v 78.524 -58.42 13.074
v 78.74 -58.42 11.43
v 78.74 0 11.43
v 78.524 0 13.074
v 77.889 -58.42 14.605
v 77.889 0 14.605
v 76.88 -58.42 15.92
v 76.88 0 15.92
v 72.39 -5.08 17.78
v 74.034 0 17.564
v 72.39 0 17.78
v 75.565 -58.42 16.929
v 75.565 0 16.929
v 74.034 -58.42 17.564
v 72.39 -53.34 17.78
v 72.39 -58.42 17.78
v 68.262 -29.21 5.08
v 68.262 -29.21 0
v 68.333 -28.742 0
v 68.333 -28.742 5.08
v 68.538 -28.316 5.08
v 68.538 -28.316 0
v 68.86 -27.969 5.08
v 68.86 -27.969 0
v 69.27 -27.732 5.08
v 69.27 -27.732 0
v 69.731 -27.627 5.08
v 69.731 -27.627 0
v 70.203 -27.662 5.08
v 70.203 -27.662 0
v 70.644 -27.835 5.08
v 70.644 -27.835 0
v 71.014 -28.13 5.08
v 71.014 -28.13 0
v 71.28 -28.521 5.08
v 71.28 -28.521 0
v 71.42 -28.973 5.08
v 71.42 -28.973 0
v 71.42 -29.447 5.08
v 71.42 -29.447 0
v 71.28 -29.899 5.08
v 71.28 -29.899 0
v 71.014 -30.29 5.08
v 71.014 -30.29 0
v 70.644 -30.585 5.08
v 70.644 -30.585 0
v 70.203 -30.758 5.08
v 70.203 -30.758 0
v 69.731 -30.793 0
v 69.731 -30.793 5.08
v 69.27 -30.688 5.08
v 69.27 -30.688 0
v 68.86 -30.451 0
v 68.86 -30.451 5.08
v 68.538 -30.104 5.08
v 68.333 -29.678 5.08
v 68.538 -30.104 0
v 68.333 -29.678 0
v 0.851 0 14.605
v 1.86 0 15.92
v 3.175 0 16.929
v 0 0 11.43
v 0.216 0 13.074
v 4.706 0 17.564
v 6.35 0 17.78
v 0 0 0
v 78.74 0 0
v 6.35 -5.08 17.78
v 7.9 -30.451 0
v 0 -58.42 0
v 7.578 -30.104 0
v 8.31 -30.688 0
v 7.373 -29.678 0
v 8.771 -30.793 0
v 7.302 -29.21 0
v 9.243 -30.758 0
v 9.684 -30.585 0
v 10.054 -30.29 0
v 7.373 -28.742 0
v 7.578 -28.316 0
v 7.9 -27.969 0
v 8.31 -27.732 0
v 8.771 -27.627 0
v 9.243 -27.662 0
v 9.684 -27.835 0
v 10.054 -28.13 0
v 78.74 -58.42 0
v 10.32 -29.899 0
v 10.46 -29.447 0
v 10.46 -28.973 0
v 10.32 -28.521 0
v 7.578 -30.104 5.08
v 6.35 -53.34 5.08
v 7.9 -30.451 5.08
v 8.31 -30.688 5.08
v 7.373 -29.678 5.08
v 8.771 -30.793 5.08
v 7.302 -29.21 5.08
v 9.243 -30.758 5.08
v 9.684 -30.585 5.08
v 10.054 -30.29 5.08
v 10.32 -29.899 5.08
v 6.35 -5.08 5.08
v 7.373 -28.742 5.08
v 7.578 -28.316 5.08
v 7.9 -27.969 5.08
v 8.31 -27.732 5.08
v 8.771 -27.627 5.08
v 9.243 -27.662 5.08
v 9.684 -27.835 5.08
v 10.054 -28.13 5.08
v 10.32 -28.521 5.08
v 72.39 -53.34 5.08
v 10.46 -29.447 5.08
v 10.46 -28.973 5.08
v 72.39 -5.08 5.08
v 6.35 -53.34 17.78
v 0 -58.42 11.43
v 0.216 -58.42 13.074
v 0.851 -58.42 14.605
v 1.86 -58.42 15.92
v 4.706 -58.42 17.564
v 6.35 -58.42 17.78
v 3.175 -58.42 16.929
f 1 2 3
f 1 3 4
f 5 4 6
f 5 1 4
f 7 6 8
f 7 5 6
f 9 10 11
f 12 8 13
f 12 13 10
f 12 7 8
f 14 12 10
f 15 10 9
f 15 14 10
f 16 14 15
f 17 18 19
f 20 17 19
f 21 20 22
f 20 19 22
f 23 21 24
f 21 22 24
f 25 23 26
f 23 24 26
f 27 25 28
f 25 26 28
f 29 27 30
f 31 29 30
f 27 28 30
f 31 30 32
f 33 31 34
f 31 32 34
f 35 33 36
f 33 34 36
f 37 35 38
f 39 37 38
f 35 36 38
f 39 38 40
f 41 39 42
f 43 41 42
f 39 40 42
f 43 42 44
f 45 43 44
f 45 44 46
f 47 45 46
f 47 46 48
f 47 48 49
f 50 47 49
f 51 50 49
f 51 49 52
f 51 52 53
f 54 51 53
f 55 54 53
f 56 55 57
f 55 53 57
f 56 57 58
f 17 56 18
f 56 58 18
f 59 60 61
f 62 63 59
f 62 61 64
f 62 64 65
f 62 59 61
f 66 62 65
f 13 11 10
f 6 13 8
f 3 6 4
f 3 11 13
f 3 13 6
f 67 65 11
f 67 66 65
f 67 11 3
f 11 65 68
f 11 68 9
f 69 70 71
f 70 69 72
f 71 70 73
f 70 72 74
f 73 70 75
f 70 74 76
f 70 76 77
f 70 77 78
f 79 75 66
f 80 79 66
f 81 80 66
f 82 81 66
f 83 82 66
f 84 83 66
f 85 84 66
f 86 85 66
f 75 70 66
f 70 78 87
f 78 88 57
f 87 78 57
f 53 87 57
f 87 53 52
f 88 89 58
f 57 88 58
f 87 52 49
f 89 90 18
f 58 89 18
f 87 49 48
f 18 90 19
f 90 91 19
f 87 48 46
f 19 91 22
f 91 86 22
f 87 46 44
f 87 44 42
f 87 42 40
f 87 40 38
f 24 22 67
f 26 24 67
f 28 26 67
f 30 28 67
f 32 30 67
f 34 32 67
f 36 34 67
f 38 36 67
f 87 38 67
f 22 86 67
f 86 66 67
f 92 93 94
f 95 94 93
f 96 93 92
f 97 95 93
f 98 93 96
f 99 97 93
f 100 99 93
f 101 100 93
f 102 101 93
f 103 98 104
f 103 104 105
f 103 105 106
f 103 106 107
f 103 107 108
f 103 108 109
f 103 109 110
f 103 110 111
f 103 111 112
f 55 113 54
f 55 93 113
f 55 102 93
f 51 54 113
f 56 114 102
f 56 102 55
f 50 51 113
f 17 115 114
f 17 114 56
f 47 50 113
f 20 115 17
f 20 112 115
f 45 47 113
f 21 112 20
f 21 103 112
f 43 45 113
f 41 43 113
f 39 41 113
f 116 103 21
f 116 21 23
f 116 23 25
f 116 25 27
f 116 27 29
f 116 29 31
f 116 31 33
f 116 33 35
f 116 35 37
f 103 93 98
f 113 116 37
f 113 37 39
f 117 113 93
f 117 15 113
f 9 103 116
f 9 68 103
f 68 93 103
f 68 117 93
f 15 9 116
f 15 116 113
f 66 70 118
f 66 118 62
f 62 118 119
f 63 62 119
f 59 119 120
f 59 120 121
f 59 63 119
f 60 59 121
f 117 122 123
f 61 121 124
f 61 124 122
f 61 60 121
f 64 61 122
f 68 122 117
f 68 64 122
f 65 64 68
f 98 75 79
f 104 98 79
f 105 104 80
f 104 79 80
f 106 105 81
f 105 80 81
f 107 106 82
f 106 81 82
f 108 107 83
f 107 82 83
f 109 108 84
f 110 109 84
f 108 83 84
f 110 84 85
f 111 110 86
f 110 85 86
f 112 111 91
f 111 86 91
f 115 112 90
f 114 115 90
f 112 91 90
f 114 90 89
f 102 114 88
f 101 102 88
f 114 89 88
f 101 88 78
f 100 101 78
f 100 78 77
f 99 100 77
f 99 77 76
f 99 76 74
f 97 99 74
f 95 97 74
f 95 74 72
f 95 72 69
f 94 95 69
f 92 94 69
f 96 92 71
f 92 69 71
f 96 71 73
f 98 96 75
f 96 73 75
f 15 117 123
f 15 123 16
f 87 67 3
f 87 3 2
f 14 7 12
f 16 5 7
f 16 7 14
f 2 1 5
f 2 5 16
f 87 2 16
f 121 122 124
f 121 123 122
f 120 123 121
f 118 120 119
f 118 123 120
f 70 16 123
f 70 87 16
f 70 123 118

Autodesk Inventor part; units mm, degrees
ref_plane "YZ Plane" through (0, 0, 0) normal (1, 0, 0) x (0, 1, 0)
ref_plane "XZ Plane" through (0, 0, 0) normal (0, 1, 0) x (-1, 0, 0)
ref_plane "XY Plane" through (0, 0, 0) normal (0, 0, 1) x (1, 0, 0)
sketch "Sketch1" plane through (0, 0, 0) normal (0, 0, 1) x (1, 0, 0)
  line L0 (0, 0) -> (78.74, 0)
  line L1 (78.74, 0) -> (78.74, -58.42)
  line L2 (78.74, -58.42) -> (0, -58.42)
  line L3 (0, -58.42) -> (0, 0)
  dimension "d0" = 78.74
  dimension "d1" = 58.42
extrude "Extrusion1" add sketch "Sketch1" along normal blind 17.78
fillet "Fillet1" radius 6.35 2 edges at (78.74, -29.21, 17.78) (0, -29.21, 17.78)
sketch "Sketch2" plane through (0, 0, 0) normal (0, 0, -1) x (-1, 0, 0)
  circle A0 centre (-69.85, -29.21) radius 1.5875
  line L0 (-78.74, 0) -> (-78.74, -58.42) projected
  line L1 (0, 0) -> (-78.74, 0) projected
  circle A1 centre (-8.89, -29.21) radius 1.5875
  line L2 (0, -58.42) -> (0, 0) projected
  dimension "d5" = 3.175
  dimension "d6" = 8.89
  dimension "d7" = 29.21
  dimension "d8" = 3.175
  dimension "d9" = 8.89
extrude "Extrusion2" cut sketch "Sketch2" against normal blind 25.4
sketch "Sketch3" plane through (0, 0, 17.78) normal (0, 0, 1) x (1, 0, 0)
  line L0 (6.35, -58.42) -> (6.35, 0) projected
  line L1 (72.39, 0) -> (72.39, -58.42) projected
  line L2 (6.35, -5.08) -> (72.39, -5.08)
  line L3 (72.39, -5.08) -> (72.39, -53.34)
  line L4 (72.39, -53.34) -> (6.35, -53.34)
  line L5 (6.35, -53.34) -> (6.35, -5.08)
  line L6 (72.39, 0) -> (6.35, 0) projected
  line L7 (6.35, -58.42) -> (72.39, -58.42) projected
  point P0 (0, 0)
  dimension "d12" = 5.08
  dimension "d13" = 5.08
extrude "Extrusion3" cut sketch "Sketch3" against normal blind 12.7 contours L0 L2 L1 L4
properties part number "BatteryHolder" material "ABS Plastic"
